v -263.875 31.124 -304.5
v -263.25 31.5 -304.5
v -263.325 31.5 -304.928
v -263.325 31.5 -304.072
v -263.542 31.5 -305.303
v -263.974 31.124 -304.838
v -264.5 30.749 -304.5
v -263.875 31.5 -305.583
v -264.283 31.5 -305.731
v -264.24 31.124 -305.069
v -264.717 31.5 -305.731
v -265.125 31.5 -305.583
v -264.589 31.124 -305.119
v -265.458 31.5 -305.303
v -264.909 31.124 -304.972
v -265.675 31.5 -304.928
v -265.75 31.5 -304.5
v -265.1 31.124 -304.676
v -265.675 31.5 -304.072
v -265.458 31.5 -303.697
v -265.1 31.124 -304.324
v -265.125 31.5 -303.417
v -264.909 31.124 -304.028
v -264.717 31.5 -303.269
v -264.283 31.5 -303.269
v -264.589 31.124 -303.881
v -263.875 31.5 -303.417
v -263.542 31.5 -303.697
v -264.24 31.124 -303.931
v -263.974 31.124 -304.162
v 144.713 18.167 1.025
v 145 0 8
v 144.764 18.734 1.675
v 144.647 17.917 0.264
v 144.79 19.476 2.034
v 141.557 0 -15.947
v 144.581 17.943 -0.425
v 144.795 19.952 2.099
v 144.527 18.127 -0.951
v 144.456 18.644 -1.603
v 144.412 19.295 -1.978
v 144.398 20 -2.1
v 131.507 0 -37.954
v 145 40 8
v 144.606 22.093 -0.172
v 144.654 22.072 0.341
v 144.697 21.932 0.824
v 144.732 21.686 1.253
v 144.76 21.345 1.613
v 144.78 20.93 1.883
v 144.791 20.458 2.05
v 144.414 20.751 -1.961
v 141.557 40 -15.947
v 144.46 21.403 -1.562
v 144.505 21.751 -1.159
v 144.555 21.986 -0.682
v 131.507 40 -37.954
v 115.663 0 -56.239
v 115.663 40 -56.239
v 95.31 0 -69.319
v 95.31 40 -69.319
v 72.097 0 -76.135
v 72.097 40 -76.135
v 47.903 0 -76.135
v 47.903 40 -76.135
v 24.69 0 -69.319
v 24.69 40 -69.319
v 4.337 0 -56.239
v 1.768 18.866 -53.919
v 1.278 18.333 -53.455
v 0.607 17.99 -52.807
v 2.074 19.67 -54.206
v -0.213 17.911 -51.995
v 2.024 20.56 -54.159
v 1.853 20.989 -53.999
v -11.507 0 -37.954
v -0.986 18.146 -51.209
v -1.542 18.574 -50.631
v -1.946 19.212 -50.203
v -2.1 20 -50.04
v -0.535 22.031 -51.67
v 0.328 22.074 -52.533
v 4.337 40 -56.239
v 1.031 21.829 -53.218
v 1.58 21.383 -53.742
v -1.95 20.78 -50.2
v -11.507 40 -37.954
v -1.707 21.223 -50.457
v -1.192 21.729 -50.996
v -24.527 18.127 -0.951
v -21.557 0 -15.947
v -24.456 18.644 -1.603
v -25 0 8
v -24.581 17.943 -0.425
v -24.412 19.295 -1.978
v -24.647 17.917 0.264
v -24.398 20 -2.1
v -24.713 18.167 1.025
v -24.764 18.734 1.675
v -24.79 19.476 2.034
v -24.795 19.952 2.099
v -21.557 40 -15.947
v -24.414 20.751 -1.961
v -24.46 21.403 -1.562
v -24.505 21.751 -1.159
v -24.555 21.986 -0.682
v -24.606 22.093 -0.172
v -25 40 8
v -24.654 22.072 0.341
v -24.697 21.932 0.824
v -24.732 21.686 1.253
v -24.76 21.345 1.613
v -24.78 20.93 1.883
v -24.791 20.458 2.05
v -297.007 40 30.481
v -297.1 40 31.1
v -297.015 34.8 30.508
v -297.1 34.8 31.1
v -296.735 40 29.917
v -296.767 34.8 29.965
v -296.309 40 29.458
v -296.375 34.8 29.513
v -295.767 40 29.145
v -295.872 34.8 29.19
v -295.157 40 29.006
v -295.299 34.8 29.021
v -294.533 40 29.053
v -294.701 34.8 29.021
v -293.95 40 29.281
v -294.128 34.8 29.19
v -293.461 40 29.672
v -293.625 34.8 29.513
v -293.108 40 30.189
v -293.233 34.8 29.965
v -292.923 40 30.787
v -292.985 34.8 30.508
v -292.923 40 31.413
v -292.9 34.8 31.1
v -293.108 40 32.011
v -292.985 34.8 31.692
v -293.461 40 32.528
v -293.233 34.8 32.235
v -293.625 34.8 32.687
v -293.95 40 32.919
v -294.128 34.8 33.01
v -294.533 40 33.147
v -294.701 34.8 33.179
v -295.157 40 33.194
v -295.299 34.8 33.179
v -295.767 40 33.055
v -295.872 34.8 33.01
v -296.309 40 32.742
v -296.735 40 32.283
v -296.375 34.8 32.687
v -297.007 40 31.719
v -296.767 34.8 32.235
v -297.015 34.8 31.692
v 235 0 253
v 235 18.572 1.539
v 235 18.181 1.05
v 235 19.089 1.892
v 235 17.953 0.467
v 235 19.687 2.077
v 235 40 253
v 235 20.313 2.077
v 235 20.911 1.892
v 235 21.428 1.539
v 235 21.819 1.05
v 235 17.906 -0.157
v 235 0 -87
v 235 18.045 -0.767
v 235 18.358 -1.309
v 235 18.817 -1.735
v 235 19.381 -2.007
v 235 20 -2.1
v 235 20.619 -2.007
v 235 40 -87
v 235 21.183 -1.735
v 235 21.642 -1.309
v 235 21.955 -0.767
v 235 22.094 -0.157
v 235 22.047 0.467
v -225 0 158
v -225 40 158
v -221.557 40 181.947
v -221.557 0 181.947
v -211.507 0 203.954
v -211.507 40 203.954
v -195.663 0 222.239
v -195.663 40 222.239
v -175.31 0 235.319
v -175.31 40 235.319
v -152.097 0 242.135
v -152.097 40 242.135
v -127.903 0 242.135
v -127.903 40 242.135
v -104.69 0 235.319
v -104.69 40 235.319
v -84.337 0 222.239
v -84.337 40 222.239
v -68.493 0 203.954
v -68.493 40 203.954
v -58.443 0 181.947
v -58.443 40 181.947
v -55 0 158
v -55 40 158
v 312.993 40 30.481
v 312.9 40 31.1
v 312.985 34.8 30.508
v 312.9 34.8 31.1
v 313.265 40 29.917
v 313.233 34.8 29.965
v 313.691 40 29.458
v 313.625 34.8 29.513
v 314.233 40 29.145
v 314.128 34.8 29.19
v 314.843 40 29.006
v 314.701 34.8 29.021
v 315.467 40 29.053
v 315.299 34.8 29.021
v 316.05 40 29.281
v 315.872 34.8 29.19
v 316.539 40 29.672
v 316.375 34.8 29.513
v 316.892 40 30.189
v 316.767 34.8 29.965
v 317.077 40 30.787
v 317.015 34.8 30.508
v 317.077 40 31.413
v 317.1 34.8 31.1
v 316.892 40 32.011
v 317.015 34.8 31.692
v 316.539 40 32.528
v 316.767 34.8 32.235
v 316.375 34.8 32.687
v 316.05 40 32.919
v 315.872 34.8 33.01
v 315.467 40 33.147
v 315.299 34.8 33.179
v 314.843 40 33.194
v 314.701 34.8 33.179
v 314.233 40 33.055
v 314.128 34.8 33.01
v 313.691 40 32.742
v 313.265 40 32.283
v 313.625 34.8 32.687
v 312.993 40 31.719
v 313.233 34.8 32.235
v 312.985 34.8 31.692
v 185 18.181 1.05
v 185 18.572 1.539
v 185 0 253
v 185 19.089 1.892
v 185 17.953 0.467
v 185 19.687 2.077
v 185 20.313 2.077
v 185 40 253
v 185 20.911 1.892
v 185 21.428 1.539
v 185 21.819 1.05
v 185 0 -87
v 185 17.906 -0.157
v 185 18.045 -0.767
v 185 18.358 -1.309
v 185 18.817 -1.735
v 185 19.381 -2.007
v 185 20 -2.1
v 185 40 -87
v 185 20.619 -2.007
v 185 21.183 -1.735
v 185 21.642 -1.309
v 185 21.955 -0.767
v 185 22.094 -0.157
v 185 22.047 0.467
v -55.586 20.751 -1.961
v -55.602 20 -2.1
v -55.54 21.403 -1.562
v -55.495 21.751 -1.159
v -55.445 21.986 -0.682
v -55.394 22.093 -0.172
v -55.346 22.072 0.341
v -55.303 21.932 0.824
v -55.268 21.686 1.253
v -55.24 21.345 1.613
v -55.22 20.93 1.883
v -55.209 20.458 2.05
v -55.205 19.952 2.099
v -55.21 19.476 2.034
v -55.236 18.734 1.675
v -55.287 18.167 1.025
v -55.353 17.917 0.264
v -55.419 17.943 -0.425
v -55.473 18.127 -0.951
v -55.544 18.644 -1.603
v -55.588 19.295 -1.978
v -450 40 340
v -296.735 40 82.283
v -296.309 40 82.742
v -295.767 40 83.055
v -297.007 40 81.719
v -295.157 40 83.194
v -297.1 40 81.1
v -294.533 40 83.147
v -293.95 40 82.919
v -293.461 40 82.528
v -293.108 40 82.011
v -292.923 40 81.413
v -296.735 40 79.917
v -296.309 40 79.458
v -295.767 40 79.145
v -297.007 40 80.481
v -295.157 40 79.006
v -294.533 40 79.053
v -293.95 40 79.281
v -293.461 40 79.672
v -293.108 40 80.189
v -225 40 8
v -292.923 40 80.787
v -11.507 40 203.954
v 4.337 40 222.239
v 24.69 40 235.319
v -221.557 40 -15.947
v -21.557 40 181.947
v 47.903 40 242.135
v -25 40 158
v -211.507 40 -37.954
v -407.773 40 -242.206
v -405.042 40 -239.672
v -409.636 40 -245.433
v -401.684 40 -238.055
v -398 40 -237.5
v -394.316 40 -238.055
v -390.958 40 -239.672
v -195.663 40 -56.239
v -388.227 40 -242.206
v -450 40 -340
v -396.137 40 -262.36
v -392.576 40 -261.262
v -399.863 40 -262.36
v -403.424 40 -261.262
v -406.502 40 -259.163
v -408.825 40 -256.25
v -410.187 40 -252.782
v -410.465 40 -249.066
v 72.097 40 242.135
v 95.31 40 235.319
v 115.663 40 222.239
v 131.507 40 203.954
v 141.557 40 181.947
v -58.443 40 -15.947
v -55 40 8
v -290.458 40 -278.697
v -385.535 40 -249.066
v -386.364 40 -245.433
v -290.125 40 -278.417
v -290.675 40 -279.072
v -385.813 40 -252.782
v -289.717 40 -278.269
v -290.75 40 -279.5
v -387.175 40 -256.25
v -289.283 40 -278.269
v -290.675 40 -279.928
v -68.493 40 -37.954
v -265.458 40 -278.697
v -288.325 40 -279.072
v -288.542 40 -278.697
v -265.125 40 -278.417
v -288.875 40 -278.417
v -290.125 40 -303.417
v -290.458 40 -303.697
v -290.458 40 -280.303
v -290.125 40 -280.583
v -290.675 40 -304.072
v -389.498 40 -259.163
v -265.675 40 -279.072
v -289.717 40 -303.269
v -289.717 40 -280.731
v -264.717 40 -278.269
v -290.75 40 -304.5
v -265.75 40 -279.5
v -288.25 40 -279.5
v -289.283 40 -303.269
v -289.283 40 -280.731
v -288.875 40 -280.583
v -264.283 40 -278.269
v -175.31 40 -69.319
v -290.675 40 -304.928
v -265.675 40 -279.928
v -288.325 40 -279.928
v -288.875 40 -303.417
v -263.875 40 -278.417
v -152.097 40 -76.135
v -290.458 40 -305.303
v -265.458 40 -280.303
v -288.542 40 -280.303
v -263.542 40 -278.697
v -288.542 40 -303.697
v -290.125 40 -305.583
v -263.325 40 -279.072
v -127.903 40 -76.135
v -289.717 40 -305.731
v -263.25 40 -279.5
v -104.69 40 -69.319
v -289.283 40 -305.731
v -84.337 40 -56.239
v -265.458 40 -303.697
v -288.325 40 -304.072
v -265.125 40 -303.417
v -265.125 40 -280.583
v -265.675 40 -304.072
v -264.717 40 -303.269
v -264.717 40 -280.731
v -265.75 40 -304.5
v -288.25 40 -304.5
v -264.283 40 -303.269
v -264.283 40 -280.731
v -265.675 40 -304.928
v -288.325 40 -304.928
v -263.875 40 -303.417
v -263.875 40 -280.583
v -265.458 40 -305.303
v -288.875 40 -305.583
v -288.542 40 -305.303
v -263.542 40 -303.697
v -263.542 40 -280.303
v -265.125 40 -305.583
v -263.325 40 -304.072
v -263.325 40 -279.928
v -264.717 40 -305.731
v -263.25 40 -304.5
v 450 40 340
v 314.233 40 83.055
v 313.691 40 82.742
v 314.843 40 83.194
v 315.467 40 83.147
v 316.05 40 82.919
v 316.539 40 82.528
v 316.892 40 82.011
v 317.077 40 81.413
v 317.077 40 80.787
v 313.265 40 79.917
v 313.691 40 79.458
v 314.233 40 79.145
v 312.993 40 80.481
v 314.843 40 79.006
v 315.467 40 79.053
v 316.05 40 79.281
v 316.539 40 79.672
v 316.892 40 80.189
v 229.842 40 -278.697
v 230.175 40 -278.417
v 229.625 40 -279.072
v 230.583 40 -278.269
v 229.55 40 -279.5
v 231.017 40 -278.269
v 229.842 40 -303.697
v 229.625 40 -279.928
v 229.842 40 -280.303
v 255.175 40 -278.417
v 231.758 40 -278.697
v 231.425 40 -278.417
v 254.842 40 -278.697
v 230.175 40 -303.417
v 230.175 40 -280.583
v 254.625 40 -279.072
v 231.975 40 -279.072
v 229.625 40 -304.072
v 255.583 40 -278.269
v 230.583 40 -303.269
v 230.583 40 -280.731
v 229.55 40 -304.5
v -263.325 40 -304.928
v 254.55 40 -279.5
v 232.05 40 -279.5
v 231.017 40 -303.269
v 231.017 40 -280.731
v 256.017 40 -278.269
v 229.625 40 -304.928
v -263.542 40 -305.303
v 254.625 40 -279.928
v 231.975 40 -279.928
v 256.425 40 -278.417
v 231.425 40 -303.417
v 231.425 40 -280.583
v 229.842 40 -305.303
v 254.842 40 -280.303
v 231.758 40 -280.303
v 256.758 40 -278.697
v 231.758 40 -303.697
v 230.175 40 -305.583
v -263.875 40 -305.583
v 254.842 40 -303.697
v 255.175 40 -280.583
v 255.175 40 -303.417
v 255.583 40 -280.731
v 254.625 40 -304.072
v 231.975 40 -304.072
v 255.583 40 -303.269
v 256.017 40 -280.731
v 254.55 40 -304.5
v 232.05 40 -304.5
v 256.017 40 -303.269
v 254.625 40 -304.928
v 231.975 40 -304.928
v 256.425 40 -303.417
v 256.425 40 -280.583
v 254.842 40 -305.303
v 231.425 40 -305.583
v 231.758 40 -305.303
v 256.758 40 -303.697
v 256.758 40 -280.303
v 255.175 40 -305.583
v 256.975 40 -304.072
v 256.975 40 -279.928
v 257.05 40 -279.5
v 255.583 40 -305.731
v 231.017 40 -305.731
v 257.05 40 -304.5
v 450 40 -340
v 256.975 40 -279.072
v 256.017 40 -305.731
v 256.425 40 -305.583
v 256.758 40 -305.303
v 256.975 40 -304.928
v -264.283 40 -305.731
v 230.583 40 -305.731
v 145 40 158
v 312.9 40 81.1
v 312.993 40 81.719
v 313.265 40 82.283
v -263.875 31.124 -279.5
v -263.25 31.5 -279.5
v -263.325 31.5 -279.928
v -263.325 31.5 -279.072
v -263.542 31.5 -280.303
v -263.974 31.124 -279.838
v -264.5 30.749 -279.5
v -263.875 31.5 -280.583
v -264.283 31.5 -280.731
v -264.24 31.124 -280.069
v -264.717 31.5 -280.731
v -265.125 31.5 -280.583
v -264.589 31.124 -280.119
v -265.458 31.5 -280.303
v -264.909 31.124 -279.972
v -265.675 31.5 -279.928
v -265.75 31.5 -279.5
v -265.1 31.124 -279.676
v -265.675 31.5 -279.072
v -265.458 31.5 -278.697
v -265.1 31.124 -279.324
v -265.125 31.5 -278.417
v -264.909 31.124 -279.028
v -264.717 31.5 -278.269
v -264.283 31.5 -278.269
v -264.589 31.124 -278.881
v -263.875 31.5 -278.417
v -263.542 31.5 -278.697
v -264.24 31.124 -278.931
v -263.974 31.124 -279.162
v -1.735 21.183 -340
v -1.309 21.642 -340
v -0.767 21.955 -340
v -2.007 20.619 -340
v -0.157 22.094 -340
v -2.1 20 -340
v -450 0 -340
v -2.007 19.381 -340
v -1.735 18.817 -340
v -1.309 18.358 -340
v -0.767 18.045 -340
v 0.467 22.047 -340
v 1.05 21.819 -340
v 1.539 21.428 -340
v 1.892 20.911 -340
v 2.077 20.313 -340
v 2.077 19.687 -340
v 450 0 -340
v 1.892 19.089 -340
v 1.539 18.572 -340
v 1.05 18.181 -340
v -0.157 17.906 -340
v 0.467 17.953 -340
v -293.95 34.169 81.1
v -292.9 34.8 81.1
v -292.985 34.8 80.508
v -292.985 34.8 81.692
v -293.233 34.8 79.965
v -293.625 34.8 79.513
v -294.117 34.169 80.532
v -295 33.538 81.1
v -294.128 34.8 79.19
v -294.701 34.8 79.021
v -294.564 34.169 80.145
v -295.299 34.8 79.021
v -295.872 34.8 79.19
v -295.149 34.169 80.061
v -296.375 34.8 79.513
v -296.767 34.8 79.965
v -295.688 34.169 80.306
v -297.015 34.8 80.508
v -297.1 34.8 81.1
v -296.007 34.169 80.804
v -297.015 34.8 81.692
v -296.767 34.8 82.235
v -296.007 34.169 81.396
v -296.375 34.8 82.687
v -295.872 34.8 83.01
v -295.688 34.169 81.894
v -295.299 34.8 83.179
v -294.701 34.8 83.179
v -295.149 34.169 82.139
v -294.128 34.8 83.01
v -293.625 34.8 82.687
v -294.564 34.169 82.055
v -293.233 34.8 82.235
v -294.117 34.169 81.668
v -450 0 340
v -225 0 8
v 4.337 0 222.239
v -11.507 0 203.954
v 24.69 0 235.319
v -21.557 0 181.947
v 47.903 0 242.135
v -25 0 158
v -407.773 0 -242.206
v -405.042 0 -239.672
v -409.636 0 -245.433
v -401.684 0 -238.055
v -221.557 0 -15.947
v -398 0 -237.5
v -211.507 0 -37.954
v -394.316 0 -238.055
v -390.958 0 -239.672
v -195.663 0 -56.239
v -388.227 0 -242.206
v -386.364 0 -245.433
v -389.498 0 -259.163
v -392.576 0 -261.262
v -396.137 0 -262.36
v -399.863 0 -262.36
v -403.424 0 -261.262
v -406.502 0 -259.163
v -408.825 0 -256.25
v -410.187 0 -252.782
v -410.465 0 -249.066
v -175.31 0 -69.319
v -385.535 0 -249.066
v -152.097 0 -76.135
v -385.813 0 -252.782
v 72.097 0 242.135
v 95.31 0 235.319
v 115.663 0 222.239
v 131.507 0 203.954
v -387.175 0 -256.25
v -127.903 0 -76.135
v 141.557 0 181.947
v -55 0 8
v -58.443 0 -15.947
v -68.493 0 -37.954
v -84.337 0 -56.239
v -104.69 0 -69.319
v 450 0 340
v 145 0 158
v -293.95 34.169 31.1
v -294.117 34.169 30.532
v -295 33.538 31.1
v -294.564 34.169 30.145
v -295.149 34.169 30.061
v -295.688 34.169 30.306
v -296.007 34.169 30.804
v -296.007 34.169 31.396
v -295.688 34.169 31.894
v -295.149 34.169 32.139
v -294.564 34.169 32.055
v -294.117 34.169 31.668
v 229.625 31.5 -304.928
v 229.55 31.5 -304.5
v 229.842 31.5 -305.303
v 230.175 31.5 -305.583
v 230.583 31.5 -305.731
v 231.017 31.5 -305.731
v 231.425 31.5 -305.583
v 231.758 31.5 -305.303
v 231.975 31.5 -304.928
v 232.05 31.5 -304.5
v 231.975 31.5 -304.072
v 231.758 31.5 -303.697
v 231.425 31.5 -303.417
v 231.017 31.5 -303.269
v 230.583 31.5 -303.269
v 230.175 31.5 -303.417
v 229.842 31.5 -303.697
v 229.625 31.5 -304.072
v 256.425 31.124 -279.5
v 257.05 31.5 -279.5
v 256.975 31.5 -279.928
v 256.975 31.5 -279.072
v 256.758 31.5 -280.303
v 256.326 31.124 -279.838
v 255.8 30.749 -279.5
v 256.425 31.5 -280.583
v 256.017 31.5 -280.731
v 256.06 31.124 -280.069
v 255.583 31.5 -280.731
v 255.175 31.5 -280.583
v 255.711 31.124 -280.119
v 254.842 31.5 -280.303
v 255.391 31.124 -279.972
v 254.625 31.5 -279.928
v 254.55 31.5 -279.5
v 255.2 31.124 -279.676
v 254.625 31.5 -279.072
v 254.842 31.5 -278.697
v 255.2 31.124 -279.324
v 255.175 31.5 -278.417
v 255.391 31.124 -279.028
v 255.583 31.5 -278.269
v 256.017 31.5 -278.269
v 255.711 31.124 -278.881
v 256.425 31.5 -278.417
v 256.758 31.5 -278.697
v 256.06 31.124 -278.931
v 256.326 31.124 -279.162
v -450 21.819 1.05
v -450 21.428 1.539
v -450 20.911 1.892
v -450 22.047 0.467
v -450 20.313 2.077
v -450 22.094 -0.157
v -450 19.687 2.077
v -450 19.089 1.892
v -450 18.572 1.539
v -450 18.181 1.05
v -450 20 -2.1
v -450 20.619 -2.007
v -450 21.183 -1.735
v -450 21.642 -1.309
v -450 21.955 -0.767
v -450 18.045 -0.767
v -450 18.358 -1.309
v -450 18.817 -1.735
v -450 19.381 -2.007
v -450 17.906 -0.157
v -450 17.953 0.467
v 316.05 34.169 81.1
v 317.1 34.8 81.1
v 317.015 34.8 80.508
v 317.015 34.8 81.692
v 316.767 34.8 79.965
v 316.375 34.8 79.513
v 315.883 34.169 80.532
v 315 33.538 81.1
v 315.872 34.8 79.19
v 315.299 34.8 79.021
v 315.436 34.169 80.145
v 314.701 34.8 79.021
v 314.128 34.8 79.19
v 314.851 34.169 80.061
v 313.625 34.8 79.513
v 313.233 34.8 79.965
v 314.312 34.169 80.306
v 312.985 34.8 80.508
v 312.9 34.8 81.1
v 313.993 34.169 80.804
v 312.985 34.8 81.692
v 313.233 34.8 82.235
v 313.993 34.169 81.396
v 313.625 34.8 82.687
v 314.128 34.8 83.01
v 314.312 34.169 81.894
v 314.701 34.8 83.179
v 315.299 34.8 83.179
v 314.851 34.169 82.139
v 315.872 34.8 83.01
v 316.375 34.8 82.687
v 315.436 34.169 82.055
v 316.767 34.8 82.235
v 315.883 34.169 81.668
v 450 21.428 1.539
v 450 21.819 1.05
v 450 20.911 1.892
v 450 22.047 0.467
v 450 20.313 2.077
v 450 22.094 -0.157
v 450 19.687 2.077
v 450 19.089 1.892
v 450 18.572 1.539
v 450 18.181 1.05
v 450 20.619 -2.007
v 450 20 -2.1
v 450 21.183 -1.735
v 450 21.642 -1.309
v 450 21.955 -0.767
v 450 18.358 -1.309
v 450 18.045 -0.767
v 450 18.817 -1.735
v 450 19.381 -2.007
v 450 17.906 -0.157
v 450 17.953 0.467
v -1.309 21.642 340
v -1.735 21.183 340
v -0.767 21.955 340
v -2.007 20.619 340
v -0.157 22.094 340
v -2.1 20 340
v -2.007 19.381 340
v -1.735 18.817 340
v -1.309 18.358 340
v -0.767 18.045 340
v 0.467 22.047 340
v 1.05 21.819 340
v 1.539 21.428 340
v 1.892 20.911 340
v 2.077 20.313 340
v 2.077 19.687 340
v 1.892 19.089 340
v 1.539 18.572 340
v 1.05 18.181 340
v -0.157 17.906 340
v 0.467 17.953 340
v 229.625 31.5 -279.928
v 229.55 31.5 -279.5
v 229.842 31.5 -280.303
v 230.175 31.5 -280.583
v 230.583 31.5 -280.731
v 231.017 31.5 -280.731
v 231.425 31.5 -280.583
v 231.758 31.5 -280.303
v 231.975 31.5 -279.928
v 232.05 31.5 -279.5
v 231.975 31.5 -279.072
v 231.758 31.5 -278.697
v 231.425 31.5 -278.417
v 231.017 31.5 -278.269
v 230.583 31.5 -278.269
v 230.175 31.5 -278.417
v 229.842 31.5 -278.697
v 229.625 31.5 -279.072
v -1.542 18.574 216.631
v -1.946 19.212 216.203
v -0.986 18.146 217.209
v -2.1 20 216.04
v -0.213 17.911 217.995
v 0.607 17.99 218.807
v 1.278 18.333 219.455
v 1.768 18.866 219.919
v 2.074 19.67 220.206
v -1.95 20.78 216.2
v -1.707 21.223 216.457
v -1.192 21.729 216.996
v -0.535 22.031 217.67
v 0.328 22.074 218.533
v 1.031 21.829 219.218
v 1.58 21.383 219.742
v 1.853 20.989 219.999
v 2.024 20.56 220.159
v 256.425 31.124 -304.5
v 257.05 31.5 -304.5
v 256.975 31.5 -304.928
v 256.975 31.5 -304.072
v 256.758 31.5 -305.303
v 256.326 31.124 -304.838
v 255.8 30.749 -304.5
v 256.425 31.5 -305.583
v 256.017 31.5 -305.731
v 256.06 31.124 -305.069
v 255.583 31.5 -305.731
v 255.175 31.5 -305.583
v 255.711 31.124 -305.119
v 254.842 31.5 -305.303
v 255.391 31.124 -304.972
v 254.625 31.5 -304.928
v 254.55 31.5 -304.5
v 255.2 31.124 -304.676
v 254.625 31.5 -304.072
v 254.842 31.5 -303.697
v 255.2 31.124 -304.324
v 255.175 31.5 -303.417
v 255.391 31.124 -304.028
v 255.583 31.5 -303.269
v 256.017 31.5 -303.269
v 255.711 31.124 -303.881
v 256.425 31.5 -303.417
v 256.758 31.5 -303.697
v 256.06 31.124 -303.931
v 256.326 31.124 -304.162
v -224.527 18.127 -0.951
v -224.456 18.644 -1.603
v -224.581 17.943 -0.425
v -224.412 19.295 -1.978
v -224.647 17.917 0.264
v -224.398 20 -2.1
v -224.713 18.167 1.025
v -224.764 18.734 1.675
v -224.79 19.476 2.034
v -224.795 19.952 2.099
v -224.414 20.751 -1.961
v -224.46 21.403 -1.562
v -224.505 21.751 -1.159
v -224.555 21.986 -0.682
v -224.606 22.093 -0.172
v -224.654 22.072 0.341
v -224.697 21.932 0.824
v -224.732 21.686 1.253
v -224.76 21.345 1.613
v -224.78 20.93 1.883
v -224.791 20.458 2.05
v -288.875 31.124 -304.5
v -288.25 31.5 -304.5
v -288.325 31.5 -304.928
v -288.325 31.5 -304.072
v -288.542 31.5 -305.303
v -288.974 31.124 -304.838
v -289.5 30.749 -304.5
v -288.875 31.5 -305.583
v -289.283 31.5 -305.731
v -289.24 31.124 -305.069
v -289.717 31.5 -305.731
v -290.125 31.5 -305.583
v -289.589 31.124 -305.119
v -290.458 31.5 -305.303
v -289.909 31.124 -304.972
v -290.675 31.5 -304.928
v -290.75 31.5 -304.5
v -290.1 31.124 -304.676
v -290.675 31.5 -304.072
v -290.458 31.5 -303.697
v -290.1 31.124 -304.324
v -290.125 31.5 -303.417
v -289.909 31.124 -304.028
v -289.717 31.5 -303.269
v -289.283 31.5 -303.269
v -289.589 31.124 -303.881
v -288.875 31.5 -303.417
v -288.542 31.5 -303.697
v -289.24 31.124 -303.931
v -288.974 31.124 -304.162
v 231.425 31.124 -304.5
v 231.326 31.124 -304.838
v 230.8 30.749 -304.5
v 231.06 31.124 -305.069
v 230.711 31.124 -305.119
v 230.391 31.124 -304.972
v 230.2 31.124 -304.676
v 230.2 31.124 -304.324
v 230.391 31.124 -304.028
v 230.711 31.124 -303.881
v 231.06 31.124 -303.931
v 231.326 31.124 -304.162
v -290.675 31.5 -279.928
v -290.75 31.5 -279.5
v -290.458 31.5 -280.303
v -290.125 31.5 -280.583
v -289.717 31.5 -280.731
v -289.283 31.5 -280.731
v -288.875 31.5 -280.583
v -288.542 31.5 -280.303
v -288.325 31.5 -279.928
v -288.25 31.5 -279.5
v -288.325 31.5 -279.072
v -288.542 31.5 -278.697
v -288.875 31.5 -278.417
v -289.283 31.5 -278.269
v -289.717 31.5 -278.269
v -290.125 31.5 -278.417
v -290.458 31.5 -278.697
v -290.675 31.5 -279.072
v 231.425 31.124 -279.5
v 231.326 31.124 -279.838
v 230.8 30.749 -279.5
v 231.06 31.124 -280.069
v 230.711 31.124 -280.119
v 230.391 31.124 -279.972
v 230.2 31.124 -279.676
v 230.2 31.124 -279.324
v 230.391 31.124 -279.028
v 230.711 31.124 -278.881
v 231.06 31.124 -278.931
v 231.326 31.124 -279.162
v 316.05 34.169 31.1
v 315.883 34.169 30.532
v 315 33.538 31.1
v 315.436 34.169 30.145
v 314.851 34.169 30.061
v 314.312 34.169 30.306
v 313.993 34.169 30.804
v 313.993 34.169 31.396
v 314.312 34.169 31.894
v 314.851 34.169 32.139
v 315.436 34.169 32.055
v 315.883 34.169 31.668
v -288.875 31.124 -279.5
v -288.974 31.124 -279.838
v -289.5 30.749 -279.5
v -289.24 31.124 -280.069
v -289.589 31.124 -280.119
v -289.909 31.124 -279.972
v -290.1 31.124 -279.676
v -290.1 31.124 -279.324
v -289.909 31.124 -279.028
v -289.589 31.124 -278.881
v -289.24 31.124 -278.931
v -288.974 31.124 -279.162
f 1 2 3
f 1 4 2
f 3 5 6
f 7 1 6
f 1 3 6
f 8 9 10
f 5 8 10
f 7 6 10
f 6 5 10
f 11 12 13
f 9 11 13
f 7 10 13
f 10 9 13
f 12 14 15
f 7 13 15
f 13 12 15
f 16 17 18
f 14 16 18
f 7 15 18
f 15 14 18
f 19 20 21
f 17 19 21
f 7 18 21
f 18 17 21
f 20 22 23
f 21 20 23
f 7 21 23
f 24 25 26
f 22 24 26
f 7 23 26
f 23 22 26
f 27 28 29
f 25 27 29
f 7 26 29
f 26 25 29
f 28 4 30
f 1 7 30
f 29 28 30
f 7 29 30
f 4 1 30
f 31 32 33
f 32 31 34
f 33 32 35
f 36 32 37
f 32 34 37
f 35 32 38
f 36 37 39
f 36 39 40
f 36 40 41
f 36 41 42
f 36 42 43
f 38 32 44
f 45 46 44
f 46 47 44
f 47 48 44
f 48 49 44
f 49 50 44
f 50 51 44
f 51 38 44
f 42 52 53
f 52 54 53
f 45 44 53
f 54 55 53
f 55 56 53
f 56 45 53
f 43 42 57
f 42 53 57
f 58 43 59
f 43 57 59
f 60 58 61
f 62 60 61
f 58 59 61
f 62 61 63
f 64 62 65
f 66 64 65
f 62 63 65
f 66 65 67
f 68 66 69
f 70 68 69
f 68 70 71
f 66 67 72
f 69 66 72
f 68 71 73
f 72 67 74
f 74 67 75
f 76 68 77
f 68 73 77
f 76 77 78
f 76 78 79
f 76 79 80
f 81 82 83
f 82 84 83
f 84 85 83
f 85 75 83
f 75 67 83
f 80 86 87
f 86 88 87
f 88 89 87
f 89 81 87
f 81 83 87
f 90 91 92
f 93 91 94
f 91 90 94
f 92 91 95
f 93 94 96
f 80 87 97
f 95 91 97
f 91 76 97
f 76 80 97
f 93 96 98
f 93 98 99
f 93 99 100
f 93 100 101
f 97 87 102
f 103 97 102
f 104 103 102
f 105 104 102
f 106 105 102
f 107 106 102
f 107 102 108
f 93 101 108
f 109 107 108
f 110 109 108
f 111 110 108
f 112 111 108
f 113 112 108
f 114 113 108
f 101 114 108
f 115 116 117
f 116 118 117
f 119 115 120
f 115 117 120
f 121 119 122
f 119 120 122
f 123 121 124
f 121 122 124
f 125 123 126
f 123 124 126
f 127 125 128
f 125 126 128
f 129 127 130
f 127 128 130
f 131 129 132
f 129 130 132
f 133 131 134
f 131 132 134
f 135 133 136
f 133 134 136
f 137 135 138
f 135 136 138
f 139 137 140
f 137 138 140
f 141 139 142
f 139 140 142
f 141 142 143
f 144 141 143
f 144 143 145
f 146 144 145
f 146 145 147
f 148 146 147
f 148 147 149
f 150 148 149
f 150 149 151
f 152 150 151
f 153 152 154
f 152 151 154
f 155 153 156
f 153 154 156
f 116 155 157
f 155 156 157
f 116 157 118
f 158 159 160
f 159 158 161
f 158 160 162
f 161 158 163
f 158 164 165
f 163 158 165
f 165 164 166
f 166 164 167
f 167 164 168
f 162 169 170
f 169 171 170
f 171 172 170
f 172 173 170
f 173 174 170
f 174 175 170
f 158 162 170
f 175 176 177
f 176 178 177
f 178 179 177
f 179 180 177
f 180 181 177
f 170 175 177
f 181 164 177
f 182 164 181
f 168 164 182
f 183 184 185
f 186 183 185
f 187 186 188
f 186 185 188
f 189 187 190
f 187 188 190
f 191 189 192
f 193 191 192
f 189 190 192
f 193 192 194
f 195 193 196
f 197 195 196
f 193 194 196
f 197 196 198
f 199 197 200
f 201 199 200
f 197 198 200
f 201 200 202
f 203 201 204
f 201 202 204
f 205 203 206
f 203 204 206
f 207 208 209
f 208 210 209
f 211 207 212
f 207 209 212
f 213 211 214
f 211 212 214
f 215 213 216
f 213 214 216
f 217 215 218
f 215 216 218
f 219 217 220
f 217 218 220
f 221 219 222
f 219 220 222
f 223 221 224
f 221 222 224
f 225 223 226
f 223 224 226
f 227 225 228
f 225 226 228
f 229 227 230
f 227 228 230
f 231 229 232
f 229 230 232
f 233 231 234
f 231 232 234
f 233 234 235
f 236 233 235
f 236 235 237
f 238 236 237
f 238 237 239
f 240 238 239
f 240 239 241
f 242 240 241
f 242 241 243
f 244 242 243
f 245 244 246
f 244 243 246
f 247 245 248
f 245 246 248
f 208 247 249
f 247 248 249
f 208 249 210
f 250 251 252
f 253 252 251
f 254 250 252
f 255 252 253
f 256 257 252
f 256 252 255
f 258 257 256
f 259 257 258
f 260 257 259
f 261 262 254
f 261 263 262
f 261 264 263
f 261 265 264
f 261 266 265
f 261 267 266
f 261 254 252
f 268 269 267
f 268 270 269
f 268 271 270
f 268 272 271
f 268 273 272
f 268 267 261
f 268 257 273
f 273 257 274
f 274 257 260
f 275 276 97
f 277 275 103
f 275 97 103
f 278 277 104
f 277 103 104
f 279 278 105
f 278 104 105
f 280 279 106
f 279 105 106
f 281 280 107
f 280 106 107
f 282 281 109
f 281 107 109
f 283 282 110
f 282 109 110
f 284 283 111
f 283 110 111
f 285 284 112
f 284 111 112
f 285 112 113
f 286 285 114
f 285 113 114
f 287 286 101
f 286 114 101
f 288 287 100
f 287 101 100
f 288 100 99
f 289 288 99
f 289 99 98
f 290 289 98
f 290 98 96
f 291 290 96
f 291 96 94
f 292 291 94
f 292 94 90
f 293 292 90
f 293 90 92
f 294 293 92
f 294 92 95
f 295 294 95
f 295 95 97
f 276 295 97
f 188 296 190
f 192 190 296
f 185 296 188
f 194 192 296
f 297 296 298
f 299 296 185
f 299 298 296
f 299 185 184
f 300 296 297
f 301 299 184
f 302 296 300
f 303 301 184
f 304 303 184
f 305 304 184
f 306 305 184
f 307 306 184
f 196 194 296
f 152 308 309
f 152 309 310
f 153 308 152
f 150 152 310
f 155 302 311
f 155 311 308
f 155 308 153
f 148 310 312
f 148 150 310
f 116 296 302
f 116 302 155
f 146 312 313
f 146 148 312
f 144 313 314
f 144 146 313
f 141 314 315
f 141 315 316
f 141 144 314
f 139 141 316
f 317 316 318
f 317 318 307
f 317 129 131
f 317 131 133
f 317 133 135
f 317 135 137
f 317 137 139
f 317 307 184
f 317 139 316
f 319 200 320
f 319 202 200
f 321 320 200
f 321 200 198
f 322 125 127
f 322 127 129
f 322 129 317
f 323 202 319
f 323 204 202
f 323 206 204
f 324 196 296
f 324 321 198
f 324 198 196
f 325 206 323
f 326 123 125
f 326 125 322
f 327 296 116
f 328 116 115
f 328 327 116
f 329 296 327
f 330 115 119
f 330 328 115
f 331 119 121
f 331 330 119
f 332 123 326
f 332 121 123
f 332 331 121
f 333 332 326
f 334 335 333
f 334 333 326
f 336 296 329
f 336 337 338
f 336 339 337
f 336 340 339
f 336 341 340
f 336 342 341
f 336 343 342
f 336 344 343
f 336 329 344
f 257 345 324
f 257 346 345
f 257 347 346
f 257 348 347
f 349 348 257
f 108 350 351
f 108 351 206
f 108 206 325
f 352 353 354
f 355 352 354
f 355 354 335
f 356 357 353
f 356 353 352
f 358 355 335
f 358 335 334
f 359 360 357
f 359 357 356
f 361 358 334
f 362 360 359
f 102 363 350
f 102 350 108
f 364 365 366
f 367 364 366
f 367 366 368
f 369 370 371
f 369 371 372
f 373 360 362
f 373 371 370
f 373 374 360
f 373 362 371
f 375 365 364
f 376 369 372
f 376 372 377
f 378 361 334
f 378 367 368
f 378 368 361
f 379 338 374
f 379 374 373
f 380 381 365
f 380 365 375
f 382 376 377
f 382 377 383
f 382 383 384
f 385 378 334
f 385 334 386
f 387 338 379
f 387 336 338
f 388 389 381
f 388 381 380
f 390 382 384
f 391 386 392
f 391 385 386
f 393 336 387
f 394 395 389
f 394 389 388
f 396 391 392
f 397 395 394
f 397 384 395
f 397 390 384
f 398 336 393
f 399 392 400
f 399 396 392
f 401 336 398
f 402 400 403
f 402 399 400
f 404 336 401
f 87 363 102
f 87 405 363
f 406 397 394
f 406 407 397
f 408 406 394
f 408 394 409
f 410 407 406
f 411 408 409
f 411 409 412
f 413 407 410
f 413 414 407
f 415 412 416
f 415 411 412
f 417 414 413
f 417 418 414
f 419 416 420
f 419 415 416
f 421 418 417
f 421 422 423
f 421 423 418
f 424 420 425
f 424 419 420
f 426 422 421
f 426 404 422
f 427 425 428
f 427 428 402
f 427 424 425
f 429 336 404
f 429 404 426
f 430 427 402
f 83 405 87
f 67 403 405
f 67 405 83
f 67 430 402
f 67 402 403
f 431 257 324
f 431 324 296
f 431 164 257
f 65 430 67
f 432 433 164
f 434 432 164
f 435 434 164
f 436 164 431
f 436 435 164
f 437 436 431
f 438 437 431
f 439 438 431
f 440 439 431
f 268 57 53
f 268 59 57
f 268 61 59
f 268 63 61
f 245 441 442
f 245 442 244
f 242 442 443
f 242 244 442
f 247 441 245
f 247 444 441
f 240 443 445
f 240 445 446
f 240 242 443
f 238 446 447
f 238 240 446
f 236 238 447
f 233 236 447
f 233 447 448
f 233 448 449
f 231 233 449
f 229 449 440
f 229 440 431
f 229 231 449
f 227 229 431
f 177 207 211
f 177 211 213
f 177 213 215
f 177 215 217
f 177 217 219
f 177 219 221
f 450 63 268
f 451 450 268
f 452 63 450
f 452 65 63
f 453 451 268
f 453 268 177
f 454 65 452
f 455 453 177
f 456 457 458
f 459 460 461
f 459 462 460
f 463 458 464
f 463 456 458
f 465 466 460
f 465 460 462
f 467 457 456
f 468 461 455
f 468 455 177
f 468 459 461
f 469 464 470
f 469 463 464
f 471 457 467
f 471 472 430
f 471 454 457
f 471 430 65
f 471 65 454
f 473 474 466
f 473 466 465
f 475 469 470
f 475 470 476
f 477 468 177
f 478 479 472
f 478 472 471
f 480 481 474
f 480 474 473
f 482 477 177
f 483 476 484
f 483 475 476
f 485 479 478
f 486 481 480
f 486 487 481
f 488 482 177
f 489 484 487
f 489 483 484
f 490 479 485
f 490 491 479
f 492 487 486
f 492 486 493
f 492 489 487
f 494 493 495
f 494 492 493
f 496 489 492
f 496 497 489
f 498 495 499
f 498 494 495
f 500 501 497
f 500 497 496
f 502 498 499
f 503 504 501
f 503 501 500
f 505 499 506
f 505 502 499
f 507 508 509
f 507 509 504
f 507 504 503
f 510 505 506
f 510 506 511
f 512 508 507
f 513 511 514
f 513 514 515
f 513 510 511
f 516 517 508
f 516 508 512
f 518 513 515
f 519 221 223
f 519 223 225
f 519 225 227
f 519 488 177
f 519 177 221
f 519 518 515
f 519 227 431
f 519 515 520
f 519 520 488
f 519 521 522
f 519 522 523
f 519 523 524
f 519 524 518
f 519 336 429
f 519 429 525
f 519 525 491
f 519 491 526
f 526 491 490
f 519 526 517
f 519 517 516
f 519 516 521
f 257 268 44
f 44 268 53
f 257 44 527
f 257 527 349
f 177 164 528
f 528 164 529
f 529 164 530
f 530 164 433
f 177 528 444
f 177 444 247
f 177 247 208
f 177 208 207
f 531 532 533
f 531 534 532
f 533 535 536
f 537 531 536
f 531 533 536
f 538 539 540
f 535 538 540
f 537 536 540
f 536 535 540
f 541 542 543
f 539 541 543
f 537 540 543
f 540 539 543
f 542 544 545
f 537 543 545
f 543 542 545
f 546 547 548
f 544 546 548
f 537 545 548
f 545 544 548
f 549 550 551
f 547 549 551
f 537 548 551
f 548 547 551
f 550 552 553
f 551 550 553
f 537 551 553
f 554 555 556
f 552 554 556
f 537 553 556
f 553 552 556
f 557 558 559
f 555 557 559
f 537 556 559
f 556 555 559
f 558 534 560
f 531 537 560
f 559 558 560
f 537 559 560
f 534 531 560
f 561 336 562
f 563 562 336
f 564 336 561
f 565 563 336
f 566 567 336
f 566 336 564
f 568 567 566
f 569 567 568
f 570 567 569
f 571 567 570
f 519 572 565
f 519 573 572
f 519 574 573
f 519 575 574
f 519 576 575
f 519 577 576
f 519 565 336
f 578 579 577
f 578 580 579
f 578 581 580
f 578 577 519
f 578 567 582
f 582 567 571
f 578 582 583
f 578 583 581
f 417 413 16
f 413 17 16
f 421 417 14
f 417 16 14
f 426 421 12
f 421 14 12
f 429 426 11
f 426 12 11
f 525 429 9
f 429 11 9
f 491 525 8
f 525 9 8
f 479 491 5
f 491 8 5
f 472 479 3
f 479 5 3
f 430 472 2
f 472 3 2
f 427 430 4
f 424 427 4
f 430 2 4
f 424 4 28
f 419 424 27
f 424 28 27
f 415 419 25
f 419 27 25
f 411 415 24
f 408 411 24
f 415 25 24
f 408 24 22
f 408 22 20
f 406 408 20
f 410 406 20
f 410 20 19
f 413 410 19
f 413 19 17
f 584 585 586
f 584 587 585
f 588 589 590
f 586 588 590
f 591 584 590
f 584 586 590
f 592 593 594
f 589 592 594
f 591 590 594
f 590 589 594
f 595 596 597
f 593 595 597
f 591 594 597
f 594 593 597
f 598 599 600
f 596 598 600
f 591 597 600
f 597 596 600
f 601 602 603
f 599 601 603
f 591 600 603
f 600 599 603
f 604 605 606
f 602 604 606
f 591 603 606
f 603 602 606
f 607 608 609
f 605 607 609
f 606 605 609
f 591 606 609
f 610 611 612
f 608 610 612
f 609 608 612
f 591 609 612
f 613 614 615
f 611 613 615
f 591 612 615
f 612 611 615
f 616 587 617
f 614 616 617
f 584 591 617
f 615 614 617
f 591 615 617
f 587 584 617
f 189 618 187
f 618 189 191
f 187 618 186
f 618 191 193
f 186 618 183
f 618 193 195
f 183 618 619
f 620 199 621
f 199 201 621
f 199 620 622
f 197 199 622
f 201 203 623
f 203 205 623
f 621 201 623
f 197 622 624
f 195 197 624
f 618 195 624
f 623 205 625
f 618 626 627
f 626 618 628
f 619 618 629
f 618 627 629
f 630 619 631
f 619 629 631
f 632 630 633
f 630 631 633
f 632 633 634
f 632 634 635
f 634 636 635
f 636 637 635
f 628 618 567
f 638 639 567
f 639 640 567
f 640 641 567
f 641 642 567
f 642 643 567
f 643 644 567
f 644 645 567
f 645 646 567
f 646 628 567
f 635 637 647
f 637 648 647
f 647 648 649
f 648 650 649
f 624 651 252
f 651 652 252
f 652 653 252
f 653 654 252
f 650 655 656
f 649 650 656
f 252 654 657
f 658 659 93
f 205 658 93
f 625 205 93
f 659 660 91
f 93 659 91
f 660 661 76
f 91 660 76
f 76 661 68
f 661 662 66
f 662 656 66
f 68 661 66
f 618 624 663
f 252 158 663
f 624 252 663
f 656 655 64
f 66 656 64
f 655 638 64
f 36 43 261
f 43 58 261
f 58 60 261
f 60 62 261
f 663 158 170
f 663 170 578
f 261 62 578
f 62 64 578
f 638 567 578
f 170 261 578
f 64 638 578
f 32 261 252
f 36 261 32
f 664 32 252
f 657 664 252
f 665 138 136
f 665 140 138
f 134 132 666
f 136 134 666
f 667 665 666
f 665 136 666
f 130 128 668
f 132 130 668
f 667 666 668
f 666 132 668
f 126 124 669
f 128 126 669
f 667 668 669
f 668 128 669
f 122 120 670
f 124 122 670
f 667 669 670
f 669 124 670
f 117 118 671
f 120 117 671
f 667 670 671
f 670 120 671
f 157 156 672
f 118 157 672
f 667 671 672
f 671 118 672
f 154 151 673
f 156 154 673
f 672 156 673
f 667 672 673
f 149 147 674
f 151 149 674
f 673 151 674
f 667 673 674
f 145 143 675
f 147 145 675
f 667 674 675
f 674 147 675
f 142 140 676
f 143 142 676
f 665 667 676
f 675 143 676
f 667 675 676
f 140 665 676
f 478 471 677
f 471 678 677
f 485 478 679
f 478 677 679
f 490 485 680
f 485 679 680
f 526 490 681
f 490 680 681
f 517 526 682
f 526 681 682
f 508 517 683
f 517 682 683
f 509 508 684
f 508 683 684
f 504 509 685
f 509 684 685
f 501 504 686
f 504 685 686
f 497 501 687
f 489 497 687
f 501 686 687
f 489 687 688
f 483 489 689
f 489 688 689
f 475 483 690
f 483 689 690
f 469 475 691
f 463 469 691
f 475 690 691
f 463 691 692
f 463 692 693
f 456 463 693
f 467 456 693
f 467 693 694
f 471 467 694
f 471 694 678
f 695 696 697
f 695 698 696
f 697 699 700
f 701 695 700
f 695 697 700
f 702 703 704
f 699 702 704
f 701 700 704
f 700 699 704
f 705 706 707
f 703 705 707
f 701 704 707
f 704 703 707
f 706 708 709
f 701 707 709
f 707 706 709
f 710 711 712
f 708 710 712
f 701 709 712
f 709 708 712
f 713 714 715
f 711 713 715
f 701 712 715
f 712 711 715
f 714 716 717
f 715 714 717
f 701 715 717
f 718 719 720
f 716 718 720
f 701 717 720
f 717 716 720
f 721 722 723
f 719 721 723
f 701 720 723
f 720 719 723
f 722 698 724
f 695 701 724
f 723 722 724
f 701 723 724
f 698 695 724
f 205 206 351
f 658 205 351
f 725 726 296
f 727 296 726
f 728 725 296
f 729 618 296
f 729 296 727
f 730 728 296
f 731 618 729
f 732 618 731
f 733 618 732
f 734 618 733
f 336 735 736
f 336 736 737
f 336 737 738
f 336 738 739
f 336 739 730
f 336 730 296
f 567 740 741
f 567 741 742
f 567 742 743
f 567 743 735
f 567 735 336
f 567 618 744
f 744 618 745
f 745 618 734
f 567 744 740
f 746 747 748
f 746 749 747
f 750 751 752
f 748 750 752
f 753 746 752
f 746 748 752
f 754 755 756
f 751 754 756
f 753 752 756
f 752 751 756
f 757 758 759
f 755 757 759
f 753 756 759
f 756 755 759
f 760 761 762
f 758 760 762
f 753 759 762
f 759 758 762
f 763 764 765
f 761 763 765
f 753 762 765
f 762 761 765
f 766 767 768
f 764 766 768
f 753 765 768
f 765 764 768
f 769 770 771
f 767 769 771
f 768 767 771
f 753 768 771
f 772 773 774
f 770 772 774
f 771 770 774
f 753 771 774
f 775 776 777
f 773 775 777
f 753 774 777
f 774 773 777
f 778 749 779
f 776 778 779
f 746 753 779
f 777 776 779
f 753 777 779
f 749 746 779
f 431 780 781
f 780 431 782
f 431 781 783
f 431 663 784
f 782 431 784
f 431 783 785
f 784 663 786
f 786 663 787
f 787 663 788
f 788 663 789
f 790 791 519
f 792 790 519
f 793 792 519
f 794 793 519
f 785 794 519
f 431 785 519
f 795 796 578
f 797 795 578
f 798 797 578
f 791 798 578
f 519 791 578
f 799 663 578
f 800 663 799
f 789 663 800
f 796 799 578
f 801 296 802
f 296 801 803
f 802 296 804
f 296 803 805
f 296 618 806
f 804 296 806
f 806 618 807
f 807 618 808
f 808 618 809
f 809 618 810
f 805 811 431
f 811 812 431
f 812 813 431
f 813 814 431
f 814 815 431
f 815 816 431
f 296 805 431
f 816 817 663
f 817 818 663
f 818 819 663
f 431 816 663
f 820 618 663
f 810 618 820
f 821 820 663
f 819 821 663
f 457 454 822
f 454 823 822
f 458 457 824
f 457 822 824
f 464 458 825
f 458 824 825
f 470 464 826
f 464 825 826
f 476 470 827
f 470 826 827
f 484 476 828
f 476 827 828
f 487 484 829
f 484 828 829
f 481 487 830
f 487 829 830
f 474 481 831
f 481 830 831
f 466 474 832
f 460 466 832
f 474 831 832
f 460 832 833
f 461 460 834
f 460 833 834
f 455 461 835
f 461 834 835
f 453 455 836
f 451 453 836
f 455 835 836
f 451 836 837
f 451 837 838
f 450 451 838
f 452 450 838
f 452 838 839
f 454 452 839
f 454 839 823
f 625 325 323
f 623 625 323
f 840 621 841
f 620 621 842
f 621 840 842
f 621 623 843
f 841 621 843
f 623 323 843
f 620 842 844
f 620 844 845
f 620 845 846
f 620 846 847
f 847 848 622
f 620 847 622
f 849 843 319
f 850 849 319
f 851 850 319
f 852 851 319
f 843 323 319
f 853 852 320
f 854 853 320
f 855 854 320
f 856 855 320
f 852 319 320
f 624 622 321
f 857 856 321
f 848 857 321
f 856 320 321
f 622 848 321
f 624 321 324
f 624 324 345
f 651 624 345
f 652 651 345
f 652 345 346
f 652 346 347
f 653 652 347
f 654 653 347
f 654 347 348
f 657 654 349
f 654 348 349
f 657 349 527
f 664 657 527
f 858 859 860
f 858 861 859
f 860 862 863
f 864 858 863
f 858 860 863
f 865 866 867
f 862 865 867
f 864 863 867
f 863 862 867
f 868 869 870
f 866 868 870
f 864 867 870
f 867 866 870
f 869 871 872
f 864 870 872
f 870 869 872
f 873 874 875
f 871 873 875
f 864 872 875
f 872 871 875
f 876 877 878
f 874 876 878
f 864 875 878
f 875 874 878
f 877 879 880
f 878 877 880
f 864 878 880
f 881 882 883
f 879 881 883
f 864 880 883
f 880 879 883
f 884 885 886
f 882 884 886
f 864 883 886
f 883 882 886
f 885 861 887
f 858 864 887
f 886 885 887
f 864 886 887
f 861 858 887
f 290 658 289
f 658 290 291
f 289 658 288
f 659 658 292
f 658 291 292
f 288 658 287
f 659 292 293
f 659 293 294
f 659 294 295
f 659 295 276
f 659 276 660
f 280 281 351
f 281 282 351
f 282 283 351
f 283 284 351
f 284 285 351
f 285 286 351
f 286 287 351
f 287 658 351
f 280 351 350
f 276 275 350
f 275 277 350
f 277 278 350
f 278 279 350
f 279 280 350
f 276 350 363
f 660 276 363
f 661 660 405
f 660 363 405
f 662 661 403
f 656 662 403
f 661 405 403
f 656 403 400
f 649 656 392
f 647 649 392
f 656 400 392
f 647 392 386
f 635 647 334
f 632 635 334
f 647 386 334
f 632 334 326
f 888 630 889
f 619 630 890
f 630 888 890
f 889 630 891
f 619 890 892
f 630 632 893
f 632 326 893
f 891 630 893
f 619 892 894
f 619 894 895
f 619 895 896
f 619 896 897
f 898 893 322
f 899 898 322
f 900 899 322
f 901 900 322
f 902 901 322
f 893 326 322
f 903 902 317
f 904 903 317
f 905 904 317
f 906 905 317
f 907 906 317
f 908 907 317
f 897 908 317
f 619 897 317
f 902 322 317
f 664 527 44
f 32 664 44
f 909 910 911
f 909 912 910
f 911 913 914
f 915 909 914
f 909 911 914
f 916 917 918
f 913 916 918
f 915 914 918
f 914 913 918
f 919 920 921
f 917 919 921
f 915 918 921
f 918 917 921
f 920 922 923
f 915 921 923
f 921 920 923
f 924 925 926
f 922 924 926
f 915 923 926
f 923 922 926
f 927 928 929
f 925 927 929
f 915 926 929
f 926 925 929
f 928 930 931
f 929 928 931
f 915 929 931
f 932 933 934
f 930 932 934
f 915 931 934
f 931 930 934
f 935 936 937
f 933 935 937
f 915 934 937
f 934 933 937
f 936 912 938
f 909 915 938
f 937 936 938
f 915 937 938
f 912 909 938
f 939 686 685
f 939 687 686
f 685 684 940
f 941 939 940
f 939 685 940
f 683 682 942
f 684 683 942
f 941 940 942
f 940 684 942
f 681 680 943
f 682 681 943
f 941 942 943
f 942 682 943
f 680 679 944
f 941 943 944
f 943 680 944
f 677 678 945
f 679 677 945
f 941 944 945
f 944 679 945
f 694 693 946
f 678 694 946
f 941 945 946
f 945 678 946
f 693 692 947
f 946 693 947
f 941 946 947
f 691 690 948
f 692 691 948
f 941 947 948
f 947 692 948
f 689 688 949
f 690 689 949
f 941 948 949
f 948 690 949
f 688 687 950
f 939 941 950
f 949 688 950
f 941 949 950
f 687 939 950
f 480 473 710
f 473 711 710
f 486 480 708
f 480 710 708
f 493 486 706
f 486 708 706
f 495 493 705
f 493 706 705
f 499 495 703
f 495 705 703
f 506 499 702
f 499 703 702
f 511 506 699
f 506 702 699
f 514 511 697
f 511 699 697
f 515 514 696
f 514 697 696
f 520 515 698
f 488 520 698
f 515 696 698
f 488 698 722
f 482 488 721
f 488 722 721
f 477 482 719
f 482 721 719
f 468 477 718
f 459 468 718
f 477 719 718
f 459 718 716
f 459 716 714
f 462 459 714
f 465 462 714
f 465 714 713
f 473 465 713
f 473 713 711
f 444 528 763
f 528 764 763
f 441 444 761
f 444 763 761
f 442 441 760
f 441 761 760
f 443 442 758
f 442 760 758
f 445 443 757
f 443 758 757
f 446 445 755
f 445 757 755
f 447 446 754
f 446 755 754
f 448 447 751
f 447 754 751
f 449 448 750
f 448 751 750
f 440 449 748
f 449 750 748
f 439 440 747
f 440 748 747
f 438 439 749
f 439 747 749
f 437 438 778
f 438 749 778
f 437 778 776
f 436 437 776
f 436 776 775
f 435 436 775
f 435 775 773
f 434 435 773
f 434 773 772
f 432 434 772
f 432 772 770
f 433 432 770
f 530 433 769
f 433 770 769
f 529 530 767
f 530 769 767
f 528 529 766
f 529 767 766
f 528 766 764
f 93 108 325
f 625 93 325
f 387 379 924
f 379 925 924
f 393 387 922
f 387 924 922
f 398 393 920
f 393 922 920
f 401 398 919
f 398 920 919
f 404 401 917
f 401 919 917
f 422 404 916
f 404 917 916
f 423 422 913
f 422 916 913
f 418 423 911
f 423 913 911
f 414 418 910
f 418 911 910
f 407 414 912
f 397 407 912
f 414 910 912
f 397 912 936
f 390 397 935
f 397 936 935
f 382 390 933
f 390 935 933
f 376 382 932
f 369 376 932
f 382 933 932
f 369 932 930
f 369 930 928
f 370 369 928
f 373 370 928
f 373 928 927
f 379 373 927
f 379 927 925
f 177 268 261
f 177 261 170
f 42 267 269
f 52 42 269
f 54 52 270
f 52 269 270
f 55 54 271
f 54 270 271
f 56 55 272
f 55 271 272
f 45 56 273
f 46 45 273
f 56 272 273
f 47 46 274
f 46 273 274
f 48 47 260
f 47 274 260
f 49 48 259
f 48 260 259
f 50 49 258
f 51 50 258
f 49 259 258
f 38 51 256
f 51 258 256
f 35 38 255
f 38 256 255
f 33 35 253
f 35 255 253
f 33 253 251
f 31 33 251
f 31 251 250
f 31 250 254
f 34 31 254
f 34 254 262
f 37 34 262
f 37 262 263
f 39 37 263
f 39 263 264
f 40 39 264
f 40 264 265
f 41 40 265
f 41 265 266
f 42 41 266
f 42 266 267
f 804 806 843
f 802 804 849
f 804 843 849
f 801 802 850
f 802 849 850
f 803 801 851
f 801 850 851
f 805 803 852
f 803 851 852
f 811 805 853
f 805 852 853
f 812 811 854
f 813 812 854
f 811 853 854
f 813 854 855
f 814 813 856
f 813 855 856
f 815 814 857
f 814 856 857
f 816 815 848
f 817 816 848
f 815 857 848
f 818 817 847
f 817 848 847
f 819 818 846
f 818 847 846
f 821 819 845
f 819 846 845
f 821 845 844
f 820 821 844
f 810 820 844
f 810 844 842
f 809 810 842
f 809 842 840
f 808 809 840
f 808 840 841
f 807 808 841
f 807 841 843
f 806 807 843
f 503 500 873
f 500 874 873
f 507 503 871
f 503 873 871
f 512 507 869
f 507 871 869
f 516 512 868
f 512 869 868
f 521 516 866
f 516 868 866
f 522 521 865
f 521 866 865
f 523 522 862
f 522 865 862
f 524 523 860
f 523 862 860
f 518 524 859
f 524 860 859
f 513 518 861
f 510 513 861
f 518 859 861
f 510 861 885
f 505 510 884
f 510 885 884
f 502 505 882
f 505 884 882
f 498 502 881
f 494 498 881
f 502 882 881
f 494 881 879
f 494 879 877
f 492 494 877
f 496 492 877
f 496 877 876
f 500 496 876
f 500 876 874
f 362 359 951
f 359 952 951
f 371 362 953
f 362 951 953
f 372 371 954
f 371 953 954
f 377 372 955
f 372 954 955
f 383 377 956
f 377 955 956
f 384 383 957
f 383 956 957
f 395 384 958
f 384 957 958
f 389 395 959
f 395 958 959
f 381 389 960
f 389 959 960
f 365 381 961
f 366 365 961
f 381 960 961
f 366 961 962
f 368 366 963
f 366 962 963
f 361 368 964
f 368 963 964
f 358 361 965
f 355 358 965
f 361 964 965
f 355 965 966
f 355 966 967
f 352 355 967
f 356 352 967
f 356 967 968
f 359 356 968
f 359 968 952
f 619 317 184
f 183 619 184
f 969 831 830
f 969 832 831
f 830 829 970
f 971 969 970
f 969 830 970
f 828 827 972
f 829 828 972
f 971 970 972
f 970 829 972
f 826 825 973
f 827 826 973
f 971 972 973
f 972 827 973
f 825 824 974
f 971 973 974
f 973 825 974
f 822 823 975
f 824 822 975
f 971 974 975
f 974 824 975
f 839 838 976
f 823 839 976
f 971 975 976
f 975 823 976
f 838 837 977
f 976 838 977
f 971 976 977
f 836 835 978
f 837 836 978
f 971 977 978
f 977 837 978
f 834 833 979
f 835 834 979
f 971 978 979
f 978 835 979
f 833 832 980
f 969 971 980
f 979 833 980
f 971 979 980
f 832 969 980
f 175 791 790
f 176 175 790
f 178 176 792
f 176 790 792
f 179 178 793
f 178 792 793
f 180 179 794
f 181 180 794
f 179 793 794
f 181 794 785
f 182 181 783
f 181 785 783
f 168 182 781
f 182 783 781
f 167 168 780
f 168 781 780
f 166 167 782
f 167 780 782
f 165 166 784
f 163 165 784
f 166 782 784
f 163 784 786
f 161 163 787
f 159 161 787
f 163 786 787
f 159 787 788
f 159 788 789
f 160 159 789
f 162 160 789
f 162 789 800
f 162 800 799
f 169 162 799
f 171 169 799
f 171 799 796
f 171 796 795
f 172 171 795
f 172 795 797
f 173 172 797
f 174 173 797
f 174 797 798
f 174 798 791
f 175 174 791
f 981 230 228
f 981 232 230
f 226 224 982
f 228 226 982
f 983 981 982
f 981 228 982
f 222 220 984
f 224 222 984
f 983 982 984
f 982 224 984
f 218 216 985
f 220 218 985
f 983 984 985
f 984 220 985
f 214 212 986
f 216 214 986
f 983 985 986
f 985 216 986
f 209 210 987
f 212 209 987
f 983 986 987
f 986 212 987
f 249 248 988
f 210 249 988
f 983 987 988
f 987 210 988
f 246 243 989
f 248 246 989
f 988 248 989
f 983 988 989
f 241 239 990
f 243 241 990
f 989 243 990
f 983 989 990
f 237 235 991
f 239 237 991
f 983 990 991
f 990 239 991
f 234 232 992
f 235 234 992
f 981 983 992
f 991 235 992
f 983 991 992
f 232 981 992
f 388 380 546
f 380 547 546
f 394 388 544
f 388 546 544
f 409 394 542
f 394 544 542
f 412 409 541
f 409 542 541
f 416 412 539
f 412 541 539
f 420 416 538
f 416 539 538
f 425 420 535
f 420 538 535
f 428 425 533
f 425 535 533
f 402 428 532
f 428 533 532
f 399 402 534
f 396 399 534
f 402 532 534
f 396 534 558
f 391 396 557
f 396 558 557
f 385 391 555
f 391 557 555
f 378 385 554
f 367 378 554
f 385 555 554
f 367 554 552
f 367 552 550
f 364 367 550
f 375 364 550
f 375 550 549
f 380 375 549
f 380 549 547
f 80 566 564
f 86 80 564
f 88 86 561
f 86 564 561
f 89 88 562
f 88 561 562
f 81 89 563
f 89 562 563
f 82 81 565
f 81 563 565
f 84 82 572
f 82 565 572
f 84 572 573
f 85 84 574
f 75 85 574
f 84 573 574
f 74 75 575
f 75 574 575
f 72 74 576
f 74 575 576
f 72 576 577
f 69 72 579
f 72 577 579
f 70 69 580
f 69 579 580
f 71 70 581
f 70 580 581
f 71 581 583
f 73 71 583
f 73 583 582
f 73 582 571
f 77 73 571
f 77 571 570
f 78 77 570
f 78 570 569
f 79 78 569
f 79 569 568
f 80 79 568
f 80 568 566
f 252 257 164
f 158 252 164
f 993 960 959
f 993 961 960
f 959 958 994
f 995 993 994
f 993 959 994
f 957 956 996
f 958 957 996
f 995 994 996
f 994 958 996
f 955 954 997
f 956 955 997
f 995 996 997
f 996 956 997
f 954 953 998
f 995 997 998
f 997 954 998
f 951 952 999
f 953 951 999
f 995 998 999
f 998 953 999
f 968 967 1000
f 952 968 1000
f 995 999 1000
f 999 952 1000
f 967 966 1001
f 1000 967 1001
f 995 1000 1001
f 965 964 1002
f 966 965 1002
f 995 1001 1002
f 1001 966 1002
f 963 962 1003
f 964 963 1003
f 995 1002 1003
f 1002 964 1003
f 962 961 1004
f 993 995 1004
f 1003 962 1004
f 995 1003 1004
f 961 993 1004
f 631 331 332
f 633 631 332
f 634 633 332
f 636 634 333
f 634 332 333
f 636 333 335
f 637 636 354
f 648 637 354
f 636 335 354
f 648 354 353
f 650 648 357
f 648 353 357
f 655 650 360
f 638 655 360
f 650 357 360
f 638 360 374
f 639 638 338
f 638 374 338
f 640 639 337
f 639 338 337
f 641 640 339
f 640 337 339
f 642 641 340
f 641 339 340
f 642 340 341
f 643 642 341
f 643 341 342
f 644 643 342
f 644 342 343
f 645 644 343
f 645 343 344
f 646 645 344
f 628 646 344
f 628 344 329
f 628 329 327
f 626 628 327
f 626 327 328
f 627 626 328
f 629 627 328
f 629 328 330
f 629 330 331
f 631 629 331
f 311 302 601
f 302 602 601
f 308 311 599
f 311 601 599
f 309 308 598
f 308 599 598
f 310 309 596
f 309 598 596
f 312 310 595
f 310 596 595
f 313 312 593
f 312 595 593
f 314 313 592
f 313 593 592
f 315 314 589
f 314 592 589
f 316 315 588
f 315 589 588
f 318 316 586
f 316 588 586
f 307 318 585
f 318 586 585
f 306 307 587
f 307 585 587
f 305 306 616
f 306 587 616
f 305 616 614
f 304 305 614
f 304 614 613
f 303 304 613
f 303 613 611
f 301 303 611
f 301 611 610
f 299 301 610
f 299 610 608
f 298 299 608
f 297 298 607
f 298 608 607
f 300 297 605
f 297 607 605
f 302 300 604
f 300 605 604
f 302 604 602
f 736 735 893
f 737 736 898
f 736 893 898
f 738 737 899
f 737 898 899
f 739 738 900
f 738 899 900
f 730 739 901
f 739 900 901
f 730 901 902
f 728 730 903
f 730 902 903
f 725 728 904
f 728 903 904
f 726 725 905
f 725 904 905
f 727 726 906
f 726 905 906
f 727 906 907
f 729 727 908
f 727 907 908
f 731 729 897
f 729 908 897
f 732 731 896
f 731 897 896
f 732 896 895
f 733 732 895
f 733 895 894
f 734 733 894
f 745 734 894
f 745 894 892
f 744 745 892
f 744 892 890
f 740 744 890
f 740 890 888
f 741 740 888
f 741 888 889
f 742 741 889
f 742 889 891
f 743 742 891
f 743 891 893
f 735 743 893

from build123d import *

# Parameters (mm, degrees)
SKETCH_1_W             = 900
SKETCH_1_H             = 680
EXTRUDE_1_DEPTH        = 40
SKETCH_2_W             = 50
SKETCH_2_H             = 340
CUT_EXTRUDE_1_DEPTH    = 566.420197729
HOLE_WIZARD_M5_1_D     = 4.2
HOLE_WIZARD_M5_2_D     = 4.2
SKETCH_9_R             = 12.5
CUT_EXTRUDE_2_DEPTH    = 566.420197876
HOLE_WIZARD_M5_3_D     = 4.2
HOLE_WIZARD_M5_3_DEPTH = 5.2
HOLE_WIZARD_M5_3_TIP   = 1.2618073
HOLE_WIZARD_M3_1_D     = 2.5
HOLE_WIZARD_M3_1_DEPTH = 8.5
HOLE_WIZARD_M3_1_TIP   = 0.751075774


with BuildPart() as part:
    # 草图1 → 凸台-拉伸1 (new body)
    with BuildSketch(Plane(origin=(0, 0, 0), x_dir=(1, 0, 0), z_dir=(0, 1, 0))):
        Rectangle(SKETCH_1_W, SKETCH_1_H)
    extrude(amount=EXTRUDE_1_DEPTH)

    # 草图2 → 切除-拉伸1 (cut, through all)
    with BuildSketch(Plane(origin=(0, 40, 0), x_dir=(1, 0, 0), z_dir=(0, 1, 0))):
        with BuildLine():
            Line((-25, -8), (-25, -158))
            ThreePointArc((-25, -158), (60, -243), (145, -158))
            Line((145, -158), (145, -8))
            ThreePointArc((145, -8), (60, 77), (-25, -8))
        make_face()
        with BuildLine():
            Line((-225, -8), (-225, -158))
            ThreePointArc((-225, -158), (-140, -243), (-55, -158))
            Line((-55, -158), (-55, -8))
            ThreePointArc((-55, -8), (-140, 77), (-225, -8))
        make_face()
        with Locations((210, -83)):
            Rectangle(SKETCH_2_W, SKETCH_2_H)
    extrude(amount=-CUT_EXTRUDE_1_DEPTH, mode=Mode.SUBTRACT)

    # M5 螺纹孔1 (through all)
    with Locations(Plane.XY.offset(340)):
        with Locations((0, 20)):
            Hole(HOLE_WIZARD_M5_1_D / 2)

    # M5 螺纹孔2 (through all)
    with Locations(Plane.ZY.offset(450)):
        with Locations((0, 20)):
            Hole(HOLE_WIZARD_M5_2_D / 2)

    # 草图9 → 切除-拉伸2 (cut, through all)
    with BuildSketch(Plane(origin=(0, 40, 0), x_dir=(1, 0, 0), z_dir=(0, 1, 0))):
        with Locations(Location((-398, 250, 0), (0, 0, 270))):
            Circle(SKETCH_9_R)
    extrude(amount=-CUT_EXTRUDE_2_DEPTH, mode=Mode.SUBTRACT)

    # M5 螺纹孔3
    with Locations(Plane(origin=(0, 40, 0), x_dir=(1, 0, 0), z_dir=(0, 1, 0))):
        with Locations((-295, -31.1), (-295, -81.1), (315, -31.1), (315, -81.1)):
            Hole(HOLE_WIZARD_M5_3_D / 2, depth=HOLE_WIZARD_M5_3_DEPTH)
            with Locations((0, 0, -(HOLE_WIZARD_M5_3_DEPTH + HOLE_WIZARD_M5_3_TIP / 2))):  # 118° drill point
                Cone(0, HOLE_WIZARD_M5_3_D / 2, HOLE_WIZARD_M5_3_TIP, mode=Mode.SUBTRACT)

    # M3 螺纹孔1
    with Locations(Plane(origin=(0, 40, 0), x_dir=(1, 0, 0), z_dir=(0, 1, 0))):
        with Locations((-289.5, 304.5), (-264.5, 304.5), (-264.5, 279.5), (-289.5, 279.5), (255.8, 304.5), (255.8, 279.5), (230.8, 279.5), (230.8, 304.5)):
            Hole(HOLE_WIZARD_M3_1_D / 2, depth=HOLE_WIZARD_M3_1_DEPTH)
            with Locations((0, 0, -(HOLE_WIZARD_M3_1_DEPTH + HOLE_WIZARD_M3_1_TIP / 2))):  # 118° drill point
                Cone(0, HOLE_WIZARD_M3_1_D / 2, HOLE_WIZARD_M3_1_TIP, mode=Mode.SUBTRACT)


solid = part.part
